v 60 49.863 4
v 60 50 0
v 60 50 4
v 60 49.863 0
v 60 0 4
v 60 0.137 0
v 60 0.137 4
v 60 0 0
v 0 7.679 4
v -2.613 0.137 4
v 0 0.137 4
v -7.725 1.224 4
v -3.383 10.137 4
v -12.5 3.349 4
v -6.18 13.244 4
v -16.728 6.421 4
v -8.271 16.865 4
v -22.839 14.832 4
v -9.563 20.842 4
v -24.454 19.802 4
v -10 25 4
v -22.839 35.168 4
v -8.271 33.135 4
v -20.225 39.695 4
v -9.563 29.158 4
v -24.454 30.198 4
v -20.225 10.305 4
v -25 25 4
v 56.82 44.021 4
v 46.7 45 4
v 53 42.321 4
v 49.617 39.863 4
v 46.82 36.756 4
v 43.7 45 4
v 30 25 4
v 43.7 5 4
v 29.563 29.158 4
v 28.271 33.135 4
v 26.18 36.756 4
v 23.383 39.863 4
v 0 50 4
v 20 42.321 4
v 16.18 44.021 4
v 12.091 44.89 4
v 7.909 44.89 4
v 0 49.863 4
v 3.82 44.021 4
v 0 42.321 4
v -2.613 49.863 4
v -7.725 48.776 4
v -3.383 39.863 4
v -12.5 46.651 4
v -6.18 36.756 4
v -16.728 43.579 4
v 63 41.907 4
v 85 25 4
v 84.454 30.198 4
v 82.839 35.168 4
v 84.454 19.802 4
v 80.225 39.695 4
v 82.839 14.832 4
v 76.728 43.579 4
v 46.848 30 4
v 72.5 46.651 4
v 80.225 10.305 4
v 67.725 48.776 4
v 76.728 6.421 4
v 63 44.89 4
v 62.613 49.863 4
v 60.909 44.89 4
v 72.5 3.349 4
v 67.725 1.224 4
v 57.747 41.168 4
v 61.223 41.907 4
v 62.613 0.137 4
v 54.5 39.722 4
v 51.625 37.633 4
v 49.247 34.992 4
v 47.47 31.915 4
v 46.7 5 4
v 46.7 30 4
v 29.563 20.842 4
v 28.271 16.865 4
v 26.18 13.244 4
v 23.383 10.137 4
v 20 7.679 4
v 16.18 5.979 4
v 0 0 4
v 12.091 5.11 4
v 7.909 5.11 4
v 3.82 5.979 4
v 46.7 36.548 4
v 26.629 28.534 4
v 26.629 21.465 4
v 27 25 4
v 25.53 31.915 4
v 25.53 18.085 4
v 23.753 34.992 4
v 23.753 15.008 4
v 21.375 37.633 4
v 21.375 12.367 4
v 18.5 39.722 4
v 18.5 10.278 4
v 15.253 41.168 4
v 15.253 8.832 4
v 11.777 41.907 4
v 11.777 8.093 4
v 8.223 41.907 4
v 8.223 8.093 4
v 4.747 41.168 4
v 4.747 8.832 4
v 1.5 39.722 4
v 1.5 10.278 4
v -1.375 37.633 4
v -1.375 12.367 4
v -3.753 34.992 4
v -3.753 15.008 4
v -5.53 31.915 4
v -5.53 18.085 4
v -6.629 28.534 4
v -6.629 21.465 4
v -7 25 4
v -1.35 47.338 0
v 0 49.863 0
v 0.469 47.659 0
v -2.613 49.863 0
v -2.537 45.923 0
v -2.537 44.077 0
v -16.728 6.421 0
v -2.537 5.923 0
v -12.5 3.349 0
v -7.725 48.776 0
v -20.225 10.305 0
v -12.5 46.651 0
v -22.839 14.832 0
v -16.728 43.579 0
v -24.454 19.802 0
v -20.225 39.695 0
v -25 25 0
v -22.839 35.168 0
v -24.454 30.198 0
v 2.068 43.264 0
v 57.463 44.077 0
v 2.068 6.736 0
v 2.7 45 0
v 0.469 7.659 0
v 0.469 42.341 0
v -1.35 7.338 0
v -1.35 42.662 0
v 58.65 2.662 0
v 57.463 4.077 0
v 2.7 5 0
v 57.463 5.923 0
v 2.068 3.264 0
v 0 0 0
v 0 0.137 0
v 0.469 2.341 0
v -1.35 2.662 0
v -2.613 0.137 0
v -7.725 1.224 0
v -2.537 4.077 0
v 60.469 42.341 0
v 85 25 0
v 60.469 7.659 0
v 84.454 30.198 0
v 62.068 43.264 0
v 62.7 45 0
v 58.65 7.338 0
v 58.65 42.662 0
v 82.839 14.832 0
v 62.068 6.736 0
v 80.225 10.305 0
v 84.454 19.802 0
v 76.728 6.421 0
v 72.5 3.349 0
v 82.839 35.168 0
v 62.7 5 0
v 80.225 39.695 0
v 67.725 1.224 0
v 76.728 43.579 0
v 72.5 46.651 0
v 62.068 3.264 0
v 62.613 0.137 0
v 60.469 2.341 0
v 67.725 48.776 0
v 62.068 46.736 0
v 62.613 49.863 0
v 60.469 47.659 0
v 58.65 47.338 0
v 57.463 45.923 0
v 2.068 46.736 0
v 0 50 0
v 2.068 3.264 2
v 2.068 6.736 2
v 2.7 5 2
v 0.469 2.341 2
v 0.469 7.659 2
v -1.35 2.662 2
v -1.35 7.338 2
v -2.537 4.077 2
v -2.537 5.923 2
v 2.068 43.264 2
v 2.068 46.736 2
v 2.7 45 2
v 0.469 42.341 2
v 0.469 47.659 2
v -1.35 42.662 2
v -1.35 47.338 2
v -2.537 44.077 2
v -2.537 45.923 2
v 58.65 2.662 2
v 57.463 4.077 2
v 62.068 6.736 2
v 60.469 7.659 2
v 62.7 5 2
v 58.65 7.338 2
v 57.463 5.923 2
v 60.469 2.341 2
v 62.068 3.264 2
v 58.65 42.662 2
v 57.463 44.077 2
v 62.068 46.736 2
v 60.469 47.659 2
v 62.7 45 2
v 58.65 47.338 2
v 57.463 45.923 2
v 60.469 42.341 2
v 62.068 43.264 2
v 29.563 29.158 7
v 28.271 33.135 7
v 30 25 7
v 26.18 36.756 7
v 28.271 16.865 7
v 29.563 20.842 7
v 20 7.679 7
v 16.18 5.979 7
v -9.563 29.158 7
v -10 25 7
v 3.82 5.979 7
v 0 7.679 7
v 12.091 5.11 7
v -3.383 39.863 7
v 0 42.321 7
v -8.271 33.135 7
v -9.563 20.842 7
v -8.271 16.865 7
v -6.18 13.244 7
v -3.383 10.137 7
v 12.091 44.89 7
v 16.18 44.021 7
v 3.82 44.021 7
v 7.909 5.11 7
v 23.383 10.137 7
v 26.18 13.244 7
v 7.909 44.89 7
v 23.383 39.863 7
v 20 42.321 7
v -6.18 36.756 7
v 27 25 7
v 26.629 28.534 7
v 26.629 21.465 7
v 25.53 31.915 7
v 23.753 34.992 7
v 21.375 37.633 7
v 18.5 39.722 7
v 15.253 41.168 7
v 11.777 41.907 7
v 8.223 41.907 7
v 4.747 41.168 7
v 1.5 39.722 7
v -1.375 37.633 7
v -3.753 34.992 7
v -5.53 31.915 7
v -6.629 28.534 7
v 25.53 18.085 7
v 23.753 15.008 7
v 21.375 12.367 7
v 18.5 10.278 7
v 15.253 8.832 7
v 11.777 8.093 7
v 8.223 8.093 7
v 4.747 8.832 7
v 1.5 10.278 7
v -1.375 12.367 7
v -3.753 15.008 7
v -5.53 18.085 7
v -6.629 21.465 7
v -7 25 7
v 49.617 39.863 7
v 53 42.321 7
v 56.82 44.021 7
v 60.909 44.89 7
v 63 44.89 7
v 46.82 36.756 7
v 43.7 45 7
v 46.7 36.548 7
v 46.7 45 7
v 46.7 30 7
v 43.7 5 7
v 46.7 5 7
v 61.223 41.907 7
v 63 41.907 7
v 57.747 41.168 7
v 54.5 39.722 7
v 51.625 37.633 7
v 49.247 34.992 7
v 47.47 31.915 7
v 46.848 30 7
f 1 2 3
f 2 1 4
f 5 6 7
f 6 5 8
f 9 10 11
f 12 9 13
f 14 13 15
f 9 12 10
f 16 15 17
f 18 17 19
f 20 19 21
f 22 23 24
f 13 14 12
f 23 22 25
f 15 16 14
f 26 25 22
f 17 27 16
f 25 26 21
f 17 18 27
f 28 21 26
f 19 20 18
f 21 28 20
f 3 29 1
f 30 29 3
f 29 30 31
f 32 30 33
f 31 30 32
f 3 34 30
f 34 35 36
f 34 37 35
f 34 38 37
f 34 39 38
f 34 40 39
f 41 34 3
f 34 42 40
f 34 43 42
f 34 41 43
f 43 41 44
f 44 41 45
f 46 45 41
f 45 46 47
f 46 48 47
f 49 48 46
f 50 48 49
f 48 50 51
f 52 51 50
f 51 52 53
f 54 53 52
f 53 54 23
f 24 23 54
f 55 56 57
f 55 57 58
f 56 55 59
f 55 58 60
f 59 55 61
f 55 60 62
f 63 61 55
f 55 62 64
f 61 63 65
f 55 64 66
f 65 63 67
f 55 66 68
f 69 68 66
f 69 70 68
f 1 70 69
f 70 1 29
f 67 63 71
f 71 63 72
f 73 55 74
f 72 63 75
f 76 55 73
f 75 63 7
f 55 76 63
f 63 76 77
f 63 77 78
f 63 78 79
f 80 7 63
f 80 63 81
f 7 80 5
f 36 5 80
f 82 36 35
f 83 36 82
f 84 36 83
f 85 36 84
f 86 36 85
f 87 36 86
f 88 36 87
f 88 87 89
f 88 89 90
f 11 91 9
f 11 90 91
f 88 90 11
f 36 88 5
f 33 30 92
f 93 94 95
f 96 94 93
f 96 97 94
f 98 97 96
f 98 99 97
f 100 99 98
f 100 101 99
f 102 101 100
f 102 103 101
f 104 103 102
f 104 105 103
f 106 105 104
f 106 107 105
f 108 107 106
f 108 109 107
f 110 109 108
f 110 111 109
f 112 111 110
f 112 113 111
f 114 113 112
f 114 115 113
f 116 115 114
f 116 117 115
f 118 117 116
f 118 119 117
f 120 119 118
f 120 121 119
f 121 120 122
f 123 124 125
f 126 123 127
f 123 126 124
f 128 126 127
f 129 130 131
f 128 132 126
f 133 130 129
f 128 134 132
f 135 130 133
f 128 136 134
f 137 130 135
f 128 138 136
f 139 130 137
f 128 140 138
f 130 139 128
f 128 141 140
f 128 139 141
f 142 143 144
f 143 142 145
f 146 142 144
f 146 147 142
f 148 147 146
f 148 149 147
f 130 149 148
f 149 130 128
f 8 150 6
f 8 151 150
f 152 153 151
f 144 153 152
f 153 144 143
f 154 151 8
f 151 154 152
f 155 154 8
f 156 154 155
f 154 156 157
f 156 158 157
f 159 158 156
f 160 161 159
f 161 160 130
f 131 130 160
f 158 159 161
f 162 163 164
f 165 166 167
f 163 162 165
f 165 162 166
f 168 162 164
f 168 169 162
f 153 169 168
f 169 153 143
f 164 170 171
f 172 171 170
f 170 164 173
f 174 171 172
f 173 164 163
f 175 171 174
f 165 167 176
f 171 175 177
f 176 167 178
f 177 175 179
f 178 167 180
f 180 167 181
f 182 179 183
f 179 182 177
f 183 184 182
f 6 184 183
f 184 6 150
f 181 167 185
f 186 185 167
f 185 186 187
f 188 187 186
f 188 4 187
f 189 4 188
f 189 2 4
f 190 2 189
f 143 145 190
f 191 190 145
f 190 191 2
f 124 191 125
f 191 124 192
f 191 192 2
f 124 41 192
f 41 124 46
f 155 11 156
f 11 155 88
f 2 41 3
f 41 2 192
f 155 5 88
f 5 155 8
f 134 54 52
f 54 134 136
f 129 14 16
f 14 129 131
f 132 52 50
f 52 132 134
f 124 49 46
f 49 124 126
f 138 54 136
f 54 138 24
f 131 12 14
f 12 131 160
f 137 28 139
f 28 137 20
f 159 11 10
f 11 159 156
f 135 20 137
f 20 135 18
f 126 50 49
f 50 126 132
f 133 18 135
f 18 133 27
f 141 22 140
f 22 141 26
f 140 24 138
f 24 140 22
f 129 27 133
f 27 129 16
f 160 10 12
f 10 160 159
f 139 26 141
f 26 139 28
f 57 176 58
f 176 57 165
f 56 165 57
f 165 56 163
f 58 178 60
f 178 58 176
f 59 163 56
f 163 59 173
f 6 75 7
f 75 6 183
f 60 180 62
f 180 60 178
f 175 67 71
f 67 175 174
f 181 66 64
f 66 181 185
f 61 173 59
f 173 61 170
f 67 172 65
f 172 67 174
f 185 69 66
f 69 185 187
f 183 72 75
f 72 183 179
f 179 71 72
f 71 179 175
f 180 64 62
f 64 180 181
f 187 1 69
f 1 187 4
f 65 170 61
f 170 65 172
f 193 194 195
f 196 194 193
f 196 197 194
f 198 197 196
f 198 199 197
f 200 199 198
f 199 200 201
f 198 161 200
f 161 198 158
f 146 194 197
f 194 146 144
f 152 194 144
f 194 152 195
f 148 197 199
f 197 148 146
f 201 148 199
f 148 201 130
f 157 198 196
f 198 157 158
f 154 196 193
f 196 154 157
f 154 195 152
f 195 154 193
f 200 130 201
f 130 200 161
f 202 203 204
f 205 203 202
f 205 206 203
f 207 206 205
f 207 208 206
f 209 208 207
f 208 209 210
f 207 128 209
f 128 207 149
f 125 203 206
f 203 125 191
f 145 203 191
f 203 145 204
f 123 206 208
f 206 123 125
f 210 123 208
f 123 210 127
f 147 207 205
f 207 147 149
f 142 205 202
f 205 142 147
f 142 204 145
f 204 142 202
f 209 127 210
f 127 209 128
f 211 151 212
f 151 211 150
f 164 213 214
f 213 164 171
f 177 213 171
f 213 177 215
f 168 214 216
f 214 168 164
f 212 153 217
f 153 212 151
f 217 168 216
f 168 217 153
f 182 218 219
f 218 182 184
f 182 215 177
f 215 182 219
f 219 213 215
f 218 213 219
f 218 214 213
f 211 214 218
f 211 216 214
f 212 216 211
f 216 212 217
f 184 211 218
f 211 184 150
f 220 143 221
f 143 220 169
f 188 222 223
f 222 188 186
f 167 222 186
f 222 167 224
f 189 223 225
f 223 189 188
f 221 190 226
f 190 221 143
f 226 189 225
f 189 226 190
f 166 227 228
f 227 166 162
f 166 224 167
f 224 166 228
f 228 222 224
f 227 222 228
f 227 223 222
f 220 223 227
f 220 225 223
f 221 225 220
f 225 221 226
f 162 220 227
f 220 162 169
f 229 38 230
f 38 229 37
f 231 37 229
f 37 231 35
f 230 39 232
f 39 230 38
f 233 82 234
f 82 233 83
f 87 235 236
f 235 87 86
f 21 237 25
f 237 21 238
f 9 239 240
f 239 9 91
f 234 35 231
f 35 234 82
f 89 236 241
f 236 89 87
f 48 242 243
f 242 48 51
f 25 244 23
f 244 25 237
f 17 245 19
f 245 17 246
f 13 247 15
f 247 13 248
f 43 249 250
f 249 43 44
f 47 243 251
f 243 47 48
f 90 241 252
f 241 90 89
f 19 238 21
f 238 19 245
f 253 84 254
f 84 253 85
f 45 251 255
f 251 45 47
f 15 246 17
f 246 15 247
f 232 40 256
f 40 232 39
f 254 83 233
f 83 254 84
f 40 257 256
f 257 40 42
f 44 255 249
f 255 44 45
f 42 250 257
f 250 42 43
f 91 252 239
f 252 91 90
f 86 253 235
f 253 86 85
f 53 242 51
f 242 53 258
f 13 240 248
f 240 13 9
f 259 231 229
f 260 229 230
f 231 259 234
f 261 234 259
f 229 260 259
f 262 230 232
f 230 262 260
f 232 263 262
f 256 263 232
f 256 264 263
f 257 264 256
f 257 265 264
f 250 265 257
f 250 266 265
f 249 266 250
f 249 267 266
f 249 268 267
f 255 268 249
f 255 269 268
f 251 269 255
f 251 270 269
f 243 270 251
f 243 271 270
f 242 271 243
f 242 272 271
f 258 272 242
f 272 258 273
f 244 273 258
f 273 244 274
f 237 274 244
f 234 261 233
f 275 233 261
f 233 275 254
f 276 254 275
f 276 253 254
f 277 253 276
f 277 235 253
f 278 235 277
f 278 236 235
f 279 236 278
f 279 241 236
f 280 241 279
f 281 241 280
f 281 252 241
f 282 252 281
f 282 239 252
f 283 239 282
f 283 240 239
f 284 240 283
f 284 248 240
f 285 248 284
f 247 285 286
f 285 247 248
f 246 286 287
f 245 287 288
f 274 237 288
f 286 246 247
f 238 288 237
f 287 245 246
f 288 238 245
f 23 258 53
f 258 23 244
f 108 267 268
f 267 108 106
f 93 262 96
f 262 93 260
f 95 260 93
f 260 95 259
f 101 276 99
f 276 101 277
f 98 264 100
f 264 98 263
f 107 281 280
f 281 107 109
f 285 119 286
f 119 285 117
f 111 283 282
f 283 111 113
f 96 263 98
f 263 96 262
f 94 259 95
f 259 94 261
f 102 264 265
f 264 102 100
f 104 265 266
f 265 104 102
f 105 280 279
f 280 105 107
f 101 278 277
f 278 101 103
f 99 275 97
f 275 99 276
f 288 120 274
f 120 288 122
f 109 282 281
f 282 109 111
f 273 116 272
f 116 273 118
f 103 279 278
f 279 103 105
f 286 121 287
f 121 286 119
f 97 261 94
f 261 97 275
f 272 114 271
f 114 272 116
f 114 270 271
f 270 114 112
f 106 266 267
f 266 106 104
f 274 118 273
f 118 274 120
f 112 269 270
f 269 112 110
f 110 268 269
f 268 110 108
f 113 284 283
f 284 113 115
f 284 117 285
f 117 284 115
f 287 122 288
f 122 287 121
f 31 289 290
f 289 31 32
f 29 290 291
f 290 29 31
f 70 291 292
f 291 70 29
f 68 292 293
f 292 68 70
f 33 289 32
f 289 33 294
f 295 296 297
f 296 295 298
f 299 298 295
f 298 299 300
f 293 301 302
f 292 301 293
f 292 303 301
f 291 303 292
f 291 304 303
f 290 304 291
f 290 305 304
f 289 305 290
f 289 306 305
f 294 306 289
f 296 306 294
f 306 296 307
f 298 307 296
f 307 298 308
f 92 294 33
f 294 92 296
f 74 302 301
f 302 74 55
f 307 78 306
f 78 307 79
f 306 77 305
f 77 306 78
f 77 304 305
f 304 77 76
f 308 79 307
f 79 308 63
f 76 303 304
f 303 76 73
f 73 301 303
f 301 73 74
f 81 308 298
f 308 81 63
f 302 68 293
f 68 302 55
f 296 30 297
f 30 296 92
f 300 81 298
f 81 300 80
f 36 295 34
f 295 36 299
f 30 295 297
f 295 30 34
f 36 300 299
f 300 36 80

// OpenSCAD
//основа
difference(){
union(){  
  cube([60,50,4]);
  translate([0,25,0])
  cylinder(4,25,25);
  translate([60,25,0])
  cylinder(4,25,25);
  }
translate([0,5,0]) cylinder(2,2.7,2.7);
translate([0,45,0]) cylinder(2,2.7,2.7);
translate([60,5,0]) cylinder(2,2.7,2.7);
translate([60,45,0]) cylinder(2,2.7,2.7);

}

//буква O
difference(){
  translate([10,25,4]) cylinder(3,20,20);
  translate([10,25,4]) cylinder(3,17,17);
}

//буква r
difference(){
  translate([63,25,4]) cylinder(3,20,20);
  translate([63,25,4]) cylinder(3,17,17);
  translate([40,0,4]) cube([50,30,3]);
  translate([63,25,4]) cube(20);
  }
translate([43.7,5,4]) cube([3,40,3]); 
